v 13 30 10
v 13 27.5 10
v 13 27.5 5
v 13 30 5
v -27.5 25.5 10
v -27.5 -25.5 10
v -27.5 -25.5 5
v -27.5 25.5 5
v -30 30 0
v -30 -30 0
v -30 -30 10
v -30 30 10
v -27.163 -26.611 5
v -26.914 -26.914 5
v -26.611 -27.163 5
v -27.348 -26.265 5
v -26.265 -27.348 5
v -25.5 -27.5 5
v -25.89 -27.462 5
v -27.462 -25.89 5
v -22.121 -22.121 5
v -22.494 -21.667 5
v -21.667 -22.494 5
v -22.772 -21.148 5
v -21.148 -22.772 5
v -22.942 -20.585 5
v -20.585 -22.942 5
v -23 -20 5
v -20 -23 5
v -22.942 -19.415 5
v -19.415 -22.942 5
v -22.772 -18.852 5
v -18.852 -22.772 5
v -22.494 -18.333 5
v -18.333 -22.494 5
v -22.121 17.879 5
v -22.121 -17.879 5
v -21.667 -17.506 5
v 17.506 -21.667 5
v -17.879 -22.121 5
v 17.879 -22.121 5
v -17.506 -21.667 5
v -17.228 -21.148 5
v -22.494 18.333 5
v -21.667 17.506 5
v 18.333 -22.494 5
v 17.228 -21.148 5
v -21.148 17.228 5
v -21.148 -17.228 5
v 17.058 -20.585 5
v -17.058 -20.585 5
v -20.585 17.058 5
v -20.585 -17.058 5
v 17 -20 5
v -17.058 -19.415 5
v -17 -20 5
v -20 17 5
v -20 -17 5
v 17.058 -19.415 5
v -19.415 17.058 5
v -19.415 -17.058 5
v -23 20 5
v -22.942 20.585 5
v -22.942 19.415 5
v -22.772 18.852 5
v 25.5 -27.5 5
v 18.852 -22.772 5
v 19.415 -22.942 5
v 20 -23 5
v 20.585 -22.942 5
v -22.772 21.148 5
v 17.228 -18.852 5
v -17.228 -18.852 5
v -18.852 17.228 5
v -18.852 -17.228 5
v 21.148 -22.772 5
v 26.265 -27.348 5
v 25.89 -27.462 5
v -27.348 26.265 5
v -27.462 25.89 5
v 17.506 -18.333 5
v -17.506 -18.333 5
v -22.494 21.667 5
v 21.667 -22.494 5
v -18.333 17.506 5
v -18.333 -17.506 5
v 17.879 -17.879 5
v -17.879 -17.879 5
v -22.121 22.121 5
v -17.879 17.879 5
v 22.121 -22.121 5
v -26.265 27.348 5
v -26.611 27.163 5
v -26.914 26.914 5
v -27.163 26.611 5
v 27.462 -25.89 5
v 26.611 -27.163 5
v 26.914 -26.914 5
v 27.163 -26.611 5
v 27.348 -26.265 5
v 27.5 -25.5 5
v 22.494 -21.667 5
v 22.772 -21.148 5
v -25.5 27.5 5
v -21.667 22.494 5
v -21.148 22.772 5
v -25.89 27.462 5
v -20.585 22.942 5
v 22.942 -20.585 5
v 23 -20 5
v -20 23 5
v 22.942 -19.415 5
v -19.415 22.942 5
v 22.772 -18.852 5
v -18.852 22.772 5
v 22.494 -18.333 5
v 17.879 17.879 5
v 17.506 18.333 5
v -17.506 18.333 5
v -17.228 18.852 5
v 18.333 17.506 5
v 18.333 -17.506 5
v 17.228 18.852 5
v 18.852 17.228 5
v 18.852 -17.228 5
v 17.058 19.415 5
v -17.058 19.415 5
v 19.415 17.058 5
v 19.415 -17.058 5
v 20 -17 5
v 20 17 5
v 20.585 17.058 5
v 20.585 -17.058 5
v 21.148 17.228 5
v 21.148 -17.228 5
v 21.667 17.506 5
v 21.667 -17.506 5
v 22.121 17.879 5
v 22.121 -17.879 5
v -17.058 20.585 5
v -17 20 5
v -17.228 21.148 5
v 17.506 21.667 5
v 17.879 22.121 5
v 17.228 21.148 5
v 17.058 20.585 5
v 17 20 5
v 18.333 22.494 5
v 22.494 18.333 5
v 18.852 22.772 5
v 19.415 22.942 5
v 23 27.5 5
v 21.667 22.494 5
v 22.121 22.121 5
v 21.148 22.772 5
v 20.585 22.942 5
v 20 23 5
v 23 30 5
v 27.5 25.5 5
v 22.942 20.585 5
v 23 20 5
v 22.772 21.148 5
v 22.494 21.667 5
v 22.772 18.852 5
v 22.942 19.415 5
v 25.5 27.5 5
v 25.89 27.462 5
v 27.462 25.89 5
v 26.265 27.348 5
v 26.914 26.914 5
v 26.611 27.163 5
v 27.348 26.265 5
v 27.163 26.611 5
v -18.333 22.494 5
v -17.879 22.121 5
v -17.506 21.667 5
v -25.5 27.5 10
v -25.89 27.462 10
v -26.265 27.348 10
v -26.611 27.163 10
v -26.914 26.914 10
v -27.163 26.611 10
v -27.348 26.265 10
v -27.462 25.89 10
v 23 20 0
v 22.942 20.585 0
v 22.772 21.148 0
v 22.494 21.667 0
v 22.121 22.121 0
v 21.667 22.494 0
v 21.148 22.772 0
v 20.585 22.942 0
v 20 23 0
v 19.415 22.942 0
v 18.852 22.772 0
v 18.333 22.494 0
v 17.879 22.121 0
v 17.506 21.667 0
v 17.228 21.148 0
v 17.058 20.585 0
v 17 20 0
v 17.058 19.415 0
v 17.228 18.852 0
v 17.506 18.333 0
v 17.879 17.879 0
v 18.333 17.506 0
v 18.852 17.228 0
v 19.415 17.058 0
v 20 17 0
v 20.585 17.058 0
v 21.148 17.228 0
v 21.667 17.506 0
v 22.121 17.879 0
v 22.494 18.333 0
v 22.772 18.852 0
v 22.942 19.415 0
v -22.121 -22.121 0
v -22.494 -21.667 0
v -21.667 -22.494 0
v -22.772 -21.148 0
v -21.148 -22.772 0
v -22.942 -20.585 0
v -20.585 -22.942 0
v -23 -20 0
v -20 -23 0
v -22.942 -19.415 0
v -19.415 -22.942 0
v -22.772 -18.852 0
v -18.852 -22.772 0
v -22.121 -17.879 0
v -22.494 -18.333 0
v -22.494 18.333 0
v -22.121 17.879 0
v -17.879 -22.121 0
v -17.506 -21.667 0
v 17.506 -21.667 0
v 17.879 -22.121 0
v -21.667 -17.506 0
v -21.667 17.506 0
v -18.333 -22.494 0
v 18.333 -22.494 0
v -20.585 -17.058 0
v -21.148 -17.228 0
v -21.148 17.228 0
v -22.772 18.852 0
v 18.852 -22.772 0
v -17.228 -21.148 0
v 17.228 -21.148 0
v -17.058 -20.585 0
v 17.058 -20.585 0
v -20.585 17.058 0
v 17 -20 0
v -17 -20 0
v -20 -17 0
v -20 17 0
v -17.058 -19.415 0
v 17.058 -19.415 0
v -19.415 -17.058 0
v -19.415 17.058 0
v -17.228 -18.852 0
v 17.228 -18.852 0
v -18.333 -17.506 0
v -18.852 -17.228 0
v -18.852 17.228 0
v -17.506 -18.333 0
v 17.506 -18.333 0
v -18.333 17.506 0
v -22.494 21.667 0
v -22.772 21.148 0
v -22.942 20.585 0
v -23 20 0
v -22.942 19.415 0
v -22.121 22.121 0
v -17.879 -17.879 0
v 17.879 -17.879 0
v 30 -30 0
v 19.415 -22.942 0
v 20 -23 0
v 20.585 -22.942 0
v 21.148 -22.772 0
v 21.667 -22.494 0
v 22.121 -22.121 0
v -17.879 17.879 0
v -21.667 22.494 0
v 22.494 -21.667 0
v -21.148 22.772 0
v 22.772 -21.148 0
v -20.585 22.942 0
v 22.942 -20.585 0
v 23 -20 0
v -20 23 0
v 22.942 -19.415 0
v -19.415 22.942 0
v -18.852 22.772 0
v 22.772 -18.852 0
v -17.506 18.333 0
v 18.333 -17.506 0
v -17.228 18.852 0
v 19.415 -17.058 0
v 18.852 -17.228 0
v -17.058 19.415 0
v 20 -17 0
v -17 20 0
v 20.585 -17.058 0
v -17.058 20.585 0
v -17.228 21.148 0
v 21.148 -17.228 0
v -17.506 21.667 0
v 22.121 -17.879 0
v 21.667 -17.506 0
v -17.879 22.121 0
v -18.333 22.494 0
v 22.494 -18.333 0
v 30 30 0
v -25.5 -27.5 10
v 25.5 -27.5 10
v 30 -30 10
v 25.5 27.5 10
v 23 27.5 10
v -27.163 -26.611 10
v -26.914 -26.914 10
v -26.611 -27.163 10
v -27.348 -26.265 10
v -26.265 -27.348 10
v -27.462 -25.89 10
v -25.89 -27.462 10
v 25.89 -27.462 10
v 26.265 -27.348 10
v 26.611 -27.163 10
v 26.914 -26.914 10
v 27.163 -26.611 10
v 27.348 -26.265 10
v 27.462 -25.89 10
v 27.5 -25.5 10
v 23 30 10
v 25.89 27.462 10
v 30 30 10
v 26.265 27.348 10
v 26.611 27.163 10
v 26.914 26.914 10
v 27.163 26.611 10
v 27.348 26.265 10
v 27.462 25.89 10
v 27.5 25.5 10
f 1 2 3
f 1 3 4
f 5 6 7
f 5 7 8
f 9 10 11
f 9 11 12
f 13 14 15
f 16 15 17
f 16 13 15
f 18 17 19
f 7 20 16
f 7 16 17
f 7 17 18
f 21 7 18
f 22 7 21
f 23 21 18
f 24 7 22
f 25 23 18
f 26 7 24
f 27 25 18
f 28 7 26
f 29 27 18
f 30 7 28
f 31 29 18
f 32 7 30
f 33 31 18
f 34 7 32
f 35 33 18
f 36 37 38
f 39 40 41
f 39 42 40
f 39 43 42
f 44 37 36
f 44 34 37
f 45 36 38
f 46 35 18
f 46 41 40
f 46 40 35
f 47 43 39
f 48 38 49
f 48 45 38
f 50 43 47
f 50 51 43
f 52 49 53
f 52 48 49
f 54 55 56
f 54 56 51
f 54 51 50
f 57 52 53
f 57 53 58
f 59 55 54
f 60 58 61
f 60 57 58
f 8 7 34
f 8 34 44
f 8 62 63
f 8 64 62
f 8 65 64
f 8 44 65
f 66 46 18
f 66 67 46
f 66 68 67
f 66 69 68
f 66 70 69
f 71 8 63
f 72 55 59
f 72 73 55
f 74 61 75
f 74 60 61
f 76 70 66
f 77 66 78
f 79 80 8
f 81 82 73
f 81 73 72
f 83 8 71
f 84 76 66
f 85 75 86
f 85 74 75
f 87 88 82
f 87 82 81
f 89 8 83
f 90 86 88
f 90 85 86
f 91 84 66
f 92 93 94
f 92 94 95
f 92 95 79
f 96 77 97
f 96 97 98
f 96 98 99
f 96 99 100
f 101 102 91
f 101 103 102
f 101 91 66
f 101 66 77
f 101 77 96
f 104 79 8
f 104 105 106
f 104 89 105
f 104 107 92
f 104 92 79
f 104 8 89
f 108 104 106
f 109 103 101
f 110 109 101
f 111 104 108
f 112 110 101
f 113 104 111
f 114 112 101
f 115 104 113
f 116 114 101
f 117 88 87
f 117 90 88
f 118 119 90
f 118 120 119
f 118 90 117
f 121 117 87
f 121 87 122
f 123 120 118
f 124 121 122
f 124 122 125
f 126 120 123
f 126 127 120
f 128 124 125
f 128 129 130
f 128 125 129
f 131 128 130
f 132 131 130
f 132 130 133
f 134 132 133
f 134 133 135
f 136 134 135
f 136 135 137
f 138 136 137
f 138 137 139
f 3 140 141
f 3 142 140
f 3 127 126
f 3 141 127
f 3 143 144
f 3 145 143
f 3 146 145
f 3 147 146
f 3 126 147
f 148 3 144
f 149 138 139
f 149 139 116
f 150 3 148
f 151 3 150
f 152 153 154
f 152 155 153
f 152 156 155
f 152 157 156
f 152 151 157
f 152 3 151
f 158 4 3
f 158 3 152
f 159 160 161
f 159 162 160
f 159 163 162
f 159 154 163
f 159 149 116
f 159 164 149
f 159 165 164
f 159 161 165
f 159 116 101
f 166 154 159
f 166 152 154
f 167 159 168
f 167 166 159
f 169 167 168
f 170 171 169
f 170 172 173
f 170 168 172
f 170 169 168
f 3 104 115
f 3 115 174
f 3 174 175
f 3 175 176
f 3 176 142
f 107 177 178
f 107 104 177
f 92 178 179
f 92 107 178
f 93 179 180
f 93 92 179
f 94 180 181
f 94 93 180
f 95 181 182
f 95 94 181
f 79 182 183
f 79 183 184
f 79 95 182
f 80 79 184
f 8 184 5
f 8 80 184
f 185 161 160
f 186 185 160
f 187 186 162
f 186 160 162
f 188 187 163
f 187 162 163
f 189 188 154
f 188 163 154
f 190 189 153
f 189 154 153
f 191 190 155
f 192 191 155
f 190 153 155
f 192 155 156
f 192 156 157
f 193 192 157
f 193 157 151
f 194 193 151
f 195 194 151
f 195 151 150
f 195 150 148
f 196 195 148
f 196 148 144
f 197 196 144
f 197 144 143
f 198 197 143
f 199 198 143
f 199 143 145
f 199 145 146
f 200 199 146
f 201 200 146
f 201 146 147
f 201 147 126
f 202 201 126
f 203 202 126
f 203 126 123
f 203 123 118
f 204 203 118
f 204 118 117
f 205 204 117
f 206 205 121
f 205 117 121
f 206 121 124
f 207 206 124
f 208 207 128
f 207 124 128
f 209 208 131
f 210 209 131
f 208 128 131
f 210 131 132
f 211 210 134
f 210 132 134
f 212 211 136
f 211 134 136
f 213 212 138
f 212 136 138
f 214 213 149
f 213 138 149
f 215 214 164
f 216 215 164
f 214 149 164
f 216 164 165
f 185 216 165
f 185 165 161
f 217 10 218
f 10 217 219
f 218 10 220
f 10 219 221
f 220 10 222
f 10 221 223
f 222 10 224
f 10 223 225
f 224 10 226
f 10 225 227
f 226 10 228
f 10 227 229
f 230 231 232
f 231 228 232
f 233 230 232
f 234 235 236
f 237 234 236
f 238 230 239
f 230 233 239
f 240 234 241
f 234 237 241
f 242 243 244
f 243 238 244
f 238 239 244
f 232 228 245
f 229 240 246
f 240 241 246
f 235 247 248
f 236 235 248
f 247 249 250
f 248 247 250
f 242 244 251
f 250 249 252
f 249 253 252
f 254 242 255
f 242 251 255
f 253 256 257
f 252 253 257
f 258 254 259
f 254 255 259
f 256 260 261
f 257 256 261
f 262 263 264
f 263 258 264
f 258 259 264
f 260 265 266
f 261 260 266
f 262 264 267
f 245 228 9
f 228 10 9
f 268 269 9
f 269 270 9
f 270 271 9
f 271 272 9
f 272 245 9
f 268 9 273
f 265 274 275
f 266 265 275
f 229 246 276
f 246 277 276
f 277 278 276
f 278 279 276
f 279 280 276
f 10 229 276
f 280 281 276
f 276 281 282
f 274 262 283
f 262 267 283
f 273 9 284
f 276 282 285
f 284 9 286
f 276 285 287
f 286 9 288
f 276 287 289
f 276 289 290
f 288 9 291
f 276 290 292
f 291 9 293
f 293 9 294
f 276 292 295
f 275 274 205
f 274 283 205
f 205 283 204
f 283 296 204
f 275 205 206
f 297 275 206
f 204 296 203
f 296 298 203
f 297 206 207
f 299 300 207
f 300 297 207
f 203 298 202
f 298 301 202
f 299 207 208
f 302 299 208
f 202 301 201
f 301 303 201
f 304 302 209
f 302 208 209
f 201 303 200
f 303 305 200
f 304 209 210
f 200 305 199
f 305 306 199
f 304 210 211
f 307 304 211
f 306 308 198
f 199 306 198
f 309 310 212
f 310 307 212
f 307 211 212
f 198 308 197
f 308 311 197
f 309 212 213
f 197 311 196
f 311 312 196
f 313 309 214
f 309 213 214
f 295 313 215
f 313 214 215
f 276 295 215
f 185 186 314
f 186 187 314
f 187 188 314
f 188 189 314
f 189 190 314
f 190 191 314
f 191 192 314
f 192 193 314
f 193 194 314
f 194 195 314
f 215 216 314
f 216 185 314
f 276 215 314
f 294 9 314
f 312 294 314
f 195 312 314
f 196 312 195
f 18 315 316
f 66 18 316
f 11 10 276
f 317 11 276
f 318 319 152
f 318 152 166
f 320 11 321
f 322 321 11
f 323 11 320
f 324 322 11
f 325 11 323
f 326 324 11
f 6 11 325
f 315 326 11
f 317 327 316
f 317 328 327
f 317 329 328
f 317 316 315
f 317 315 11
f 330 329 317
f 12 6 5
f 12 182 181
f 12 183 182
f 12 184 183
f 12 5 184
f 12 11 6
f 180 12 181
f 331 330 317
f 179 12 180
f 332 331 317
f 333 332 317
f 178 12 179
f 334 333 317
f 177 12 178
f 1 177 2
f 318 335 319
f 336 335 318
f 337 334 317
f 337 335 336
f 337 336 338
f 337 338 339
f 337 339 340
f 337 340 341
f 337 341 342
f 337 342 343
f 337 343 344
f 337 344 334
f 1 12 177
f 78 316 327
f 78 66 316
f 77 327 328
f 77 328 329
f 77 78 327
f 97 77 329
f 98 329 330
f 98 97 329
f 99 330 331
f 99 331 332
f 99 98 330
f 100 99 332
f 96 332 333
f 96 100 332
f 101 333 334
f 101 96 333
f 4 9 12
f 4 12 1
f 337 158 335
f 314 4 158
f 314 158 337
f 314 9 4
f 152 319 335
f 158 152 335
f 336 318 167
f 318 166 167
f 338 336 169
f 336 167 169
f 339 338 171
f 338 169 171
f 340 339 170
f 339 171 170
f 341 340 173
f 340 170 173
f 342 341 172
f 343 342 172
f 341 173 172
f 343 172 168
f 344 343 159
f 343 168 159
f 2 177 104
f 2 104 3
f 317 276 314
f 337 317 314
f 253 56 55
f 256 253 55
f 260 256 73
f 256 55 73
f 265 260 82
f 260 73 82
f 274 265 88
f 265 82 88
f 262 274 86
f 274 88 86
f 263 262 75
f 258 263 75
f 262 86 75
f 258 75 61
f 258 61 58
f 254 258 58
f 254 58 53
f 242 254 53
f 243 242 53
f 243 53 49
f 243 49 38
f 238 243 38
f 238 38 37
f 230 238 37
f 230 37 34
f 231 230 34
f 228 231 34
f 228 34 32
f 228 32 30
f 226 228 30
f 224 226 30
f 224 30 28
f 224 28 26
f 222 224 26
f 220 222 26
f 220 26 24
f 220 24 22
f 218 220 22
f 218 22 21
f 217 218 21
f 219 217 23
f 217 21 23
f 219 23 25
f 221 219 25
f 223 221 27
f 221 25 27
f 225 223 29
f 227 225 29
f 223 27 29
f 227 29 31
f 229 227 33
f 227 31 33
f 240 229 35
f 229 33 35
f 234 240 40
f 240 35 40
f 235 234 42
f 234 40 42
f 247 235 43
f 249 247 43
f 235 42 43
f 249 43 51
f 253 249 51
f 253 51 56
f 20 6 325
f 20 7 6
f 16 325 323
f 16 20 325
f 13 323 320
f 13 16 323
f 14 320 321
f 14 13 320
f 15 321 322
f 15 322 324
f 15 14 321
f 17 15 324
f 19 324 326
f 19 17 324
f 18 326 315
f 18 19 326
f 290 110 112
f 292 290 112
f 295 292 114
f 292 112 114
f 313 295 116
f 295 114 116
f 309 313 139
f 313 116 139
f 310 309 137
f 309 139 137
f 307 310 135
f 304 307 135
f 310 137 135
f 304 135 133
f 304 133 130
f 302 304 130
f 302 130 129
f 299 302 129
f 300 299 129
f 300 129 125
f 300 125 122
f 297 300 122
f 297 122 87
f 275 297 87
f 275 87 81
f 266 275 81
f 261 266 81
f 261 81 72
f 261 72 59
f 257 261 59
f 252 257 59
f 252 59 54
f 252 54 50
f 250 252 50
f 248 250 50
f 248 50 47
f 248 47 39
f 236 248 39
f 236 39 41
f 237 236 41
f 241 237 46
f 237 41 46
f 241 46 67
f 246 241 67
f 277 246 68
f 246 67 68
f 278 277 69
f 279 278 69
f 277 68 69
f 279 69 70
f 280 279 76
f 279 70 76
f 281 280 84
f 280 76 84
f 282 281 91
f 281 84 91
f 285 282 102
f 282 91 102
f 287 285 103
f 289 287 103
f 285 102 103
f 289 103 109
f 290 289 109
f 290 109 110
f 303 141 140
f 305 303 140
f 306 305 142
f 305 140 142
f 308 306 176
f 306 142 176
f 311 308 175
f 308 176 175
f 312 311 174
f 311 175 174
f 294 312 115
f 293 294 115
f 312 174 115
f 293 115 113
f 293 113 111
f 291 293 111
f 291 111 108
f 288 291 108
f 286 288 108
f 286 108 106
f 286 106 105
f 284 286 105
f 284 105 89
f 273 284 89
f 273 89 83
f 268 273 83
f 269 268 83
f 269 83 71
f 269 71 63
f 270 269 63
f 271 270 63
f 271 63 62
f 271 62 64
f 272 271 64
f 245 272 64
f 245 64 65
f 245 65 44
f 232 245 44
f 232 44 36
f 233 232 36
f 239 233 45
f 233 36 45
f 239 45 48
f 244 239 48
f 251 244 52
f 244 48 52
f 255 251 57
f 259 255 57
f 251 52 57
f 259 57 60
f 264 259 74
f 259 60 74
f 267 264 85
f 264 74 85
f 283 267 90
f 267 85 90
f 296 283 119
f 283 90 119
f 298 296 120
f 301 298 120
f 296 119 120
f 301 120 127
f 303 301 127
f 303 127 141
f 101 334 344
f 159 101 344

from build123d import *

# Parameters (mm, degrees)
SKETCH_W        = 60
SKETCH_H        = 60
PAD_DEPTH       = 10
SKETCH001_W     = 55
SKETCH001_H     = 55
POCKET_DEPTH    = 5
FILLET_R        = 2
FILLET001_R     = 2
FILLET002_R     = 2
FILLET003_R     = 2
SKETCH002_R     = 3
HOLE_DEPTH      = 25
SKETCH003_W     = 10
SKETCH003_H     = 3
POCKET001_DEPTH = 5


with BuildPart() as part:
    # Sketch → Pad (new body)
    with BuildSketch(Plane.XY):
        Rectangle(SKETCH_W, SKETCH_H)
    extrude(amount=PAD_DEPTH)

    # Sketch001 (on Face6 of Pad) → Pocket (cut)
    with BuildSketch(Plane.XY.offset(10)):
        Rectangle(SKETCH001_W, SKETCH001_H)
    extrude(amount=-POCKET_DEPTH, mode=Mode.SUBTRACT)

    # Fillet
    fillet_edges = [part.edges().sort_by_distance(p)[0] for p in [
        (-27.5, 27.5, 7.5),
    ]]
    fillet(fillet_edges, radius=FILLET_R)

    # Fillet001
    fillet001_edges = [part.edges().sort_by_distance(p)[0] for p in [
        (27.5, 27.5, 7.5),
    ]]
    fillet(fillet001_edges, radius=FILLET001_R)

    # Fillet002
    fillet002_edges = [part.edges().sort_by_distance(p)[0] for p in [
        (-27.5, -27.5, 7.5),
    ]]
    fillet(fillet002_edges, radius=FILLET002_R)

    # Fillet003
    fillet003_edges = [part.edges().sort_by_distance(p)[0] for p in [
        (27.5, -27.5, 7.5),
    ]]
    fillet(fillet003_edges, radius=FILLET003_R)

    # Sketch002 (on Face14 of Fillet003) → Hole (cut)
    with BuildSketch(Plane.XY.offset(5)):
        with Locations((-20, 20)):
            Circle(SKETCH002_R)
        with Locations((-20, -20)):
            Circle(SKETCH002_R)
        with Locations((20, -20)):
            Circle(SKETCH002_R)
        with Locations((20, 20)):
            Circle(SKETCH002_R)
    extrude(amount=-HOLE_DEPTH, mode=Mode.SUBTRACT)

    # Sketch003 (on Face1 of Hole) → Pocket001 (cut)
    with BuildSketch(Plane.XY.offset(10)):
        with Locations((18, 28.5)):
            Rectangle(SKETCH003_W, SKETCH003_H)
    extrude(amount=-POCKET001_DEPTH, mode=Mode.SUBTRACT)


solid = part.part
